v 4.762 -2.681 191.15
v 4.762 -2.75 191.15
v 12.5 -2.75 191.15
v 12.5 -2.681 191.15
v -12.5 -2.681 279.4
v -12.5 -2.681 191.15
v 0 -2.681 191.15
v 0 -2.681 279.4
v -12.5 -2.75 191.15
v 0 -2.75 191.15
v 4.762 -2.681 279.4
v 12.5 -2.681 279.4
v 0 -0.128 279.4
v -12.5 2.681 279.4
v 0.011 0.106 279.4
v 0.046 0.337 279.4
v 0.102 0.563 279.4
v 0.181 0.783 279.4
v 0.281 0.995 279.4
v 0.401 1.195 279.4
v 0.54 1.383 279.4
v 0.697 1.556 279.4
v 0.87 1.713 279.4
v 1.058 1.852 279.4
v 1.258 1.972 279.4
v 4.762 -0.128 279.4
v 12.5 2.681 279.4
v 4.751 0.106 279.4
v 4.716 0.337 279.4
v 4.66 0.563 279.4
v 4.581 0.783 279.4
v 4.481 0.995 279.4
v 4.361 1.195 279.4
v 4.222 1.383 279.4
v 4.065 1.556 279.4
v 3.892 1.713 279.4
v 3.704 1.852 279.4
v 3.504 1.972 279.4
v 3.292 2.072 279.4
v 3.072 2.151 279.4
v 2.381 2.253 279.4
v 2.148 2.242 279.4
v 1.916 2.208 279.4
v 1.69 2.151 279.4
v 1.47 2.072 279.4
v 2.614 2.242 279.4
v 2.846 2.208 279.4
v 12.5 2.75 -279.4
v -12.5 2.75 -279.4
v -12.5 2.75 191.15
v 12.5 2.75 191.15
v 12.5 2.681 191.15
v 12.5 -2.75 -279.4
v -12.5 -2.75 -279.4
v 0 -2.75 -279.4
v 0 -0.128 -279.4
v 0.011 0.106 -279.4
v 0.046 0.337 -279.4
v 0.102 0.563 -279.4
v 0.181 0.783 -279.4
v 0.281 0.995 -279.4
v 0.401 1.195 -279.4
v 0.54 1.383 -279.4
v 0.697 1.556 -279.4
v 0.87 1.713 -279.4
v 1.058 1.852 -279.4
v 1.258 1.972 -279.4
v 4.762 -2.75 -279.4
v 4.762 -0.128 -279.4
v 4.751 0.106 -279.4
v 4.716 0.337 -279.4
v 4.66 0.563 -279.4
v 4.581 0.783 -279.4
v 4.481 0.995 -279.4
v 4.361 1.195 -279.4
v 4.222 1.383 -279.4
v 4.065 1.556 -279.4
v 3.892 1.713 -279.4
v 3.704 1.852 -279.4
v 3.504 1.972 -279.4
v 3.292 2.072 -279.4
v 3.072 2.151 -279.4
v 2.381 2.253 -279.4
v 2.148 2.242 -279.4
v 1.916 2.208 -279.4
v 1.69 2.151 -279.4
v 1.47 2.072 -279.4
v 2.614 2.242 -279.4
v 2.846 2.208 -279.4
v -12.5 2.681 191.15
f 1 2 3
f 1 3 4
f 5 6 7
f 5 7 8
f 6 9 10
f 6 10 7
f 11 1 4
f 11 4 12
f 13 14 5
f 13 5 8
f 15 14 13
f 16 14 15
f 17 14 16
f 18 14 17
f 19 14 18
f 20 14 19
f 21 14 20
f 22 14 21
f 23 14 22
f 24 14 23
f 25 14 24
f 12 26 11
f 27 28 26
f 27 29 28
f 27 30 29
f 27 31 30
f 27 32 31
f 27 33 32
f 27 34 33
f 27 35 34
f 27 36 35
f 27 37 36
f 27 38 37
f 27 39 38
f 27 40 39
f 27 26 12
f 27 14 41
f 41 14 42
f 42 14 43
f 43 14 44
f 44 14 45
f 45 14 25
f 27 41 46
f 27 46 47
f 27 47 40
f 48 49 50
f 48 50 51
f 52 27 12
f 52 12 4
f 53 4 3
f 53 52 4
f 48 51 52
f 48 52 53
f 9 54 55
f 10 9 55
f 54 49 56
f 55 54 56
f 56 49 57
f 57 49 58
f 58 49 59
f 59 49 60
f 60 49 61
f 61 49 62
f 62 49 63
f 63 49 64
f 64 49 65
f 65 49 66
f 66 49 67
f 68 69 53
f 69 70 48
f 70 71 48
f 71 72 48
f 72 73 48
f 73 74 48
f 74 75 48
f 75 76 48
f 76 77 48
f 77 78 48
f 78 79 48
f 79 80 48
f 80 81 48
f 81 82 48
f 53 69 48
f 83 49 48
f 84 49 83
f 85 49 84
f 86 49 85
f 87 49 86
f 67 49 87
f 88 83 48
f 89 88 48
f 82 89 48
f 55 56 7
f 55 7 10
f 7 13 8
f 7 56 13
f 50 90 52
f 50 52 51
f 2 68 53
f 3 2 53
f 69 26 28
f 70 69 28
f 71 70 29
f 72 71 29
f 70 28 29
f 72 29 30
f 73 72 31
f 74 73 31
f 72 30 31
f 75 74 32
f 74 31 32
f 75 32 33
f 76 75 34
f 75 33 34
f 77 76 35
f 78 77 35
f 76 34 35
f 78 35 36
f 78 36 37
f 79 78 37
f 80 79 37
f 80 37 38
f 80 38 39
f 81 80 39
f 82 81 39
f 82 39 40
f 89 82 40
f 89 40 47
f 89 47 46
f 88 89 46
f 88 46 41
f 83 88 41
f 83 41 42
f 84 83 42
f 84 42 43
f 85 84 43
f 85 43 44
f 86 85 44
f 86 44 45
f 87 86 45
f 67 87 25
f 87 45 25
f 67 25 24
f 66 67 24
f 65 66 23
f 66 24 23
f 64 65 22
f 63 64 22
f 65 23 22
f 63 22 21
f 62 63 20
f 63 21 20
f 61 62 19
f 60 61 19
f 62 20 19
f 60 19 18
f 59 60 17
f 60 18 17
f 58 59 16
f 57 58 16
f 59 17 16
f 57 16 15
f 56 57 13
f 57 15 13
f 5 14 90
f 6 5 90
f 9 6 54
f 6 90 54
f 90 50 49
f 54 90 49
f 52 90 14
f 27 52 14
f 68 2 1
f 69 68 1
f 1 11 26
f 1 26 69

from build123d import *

# Parameters (mm, degrees)
SKETCH1_W           = 25
SKETCH1_H           = 5.5
EXTRUDE1_DEPTH      = 259.4
SKETCH6_W           = 25
SKETCH6_H           = 20
BOSS_EXTRUDE2_DEPTH = 5.5
CUT_EXTRUDE2_DEPTH  = 559.8
SKETCH8_W           = 88.25
SKETCH8_H           = 0.06858
CUT_EXTRUDE3_DEPTH  = 26


with BuildPart() as part:
    # Sketch1 → Extrude1 (new body, symmetric)
    with BuildSketch(Plane.XY):
        Rectangle(SKETCH1_W, SKETCH1_H)
    extrude(amount=EXTRUDE1_DEPTH, both=True)

    # Sketch6 → Boss-Extrude2 (add)
    with BuildSketch(Plane(origin=(0, 2.75, 0), x_dir=(1, 0, 0), z_dir=(0, 1, 0))):
        with Locations((0, 269.4)):
            Rectangle(SKETCH6_W, SKETCH6_H)
        with Locations((0, -269.4)):
            Rectangle(SKETCH6_W, SKETCH6_H)
    extrude(amount=-BOSS_EXTRUDE2_DEPTH)

    # Sketch7 → Cut-Extrude2 (cut, through all)
    with BuildSketch(Plane.XY.offset(279.4)):
        with BuildLine():
            Line((-0.00025, -0.1278), (-0.00025, -2.75))
            Line((-0.00025, -2.75), (4.76225, -2.75))
            Line((4.76225, -2.75), (4.76225, -0.1278))
            ThreePointArc((4.76225, -0.1278), (2.381, 2.25345), (-0.00025, -0.1278))
        make_face()
    extrude(amount=-CUT_EXTRUDE2_DEPTH, mode=Mode.SUBTRACT)

    # Sketch8 → Cut-Extrude3 (cut, through all)
    with BuildSketch(Plane.ZY.offset(12.5)):
        with Locations((235.275, 2.71571)):
            Rectangle(SKETCH8_W, SKETCH8_H)
        with Locations((235.275, -2.71571)):
            Rectangle(SKETCH8_W, SKETCH8_H)
    extrude(amount=-CUT_EXTRUDE3_DEPTH, mode=Mode.SUBTRACT)


solid = part.part
